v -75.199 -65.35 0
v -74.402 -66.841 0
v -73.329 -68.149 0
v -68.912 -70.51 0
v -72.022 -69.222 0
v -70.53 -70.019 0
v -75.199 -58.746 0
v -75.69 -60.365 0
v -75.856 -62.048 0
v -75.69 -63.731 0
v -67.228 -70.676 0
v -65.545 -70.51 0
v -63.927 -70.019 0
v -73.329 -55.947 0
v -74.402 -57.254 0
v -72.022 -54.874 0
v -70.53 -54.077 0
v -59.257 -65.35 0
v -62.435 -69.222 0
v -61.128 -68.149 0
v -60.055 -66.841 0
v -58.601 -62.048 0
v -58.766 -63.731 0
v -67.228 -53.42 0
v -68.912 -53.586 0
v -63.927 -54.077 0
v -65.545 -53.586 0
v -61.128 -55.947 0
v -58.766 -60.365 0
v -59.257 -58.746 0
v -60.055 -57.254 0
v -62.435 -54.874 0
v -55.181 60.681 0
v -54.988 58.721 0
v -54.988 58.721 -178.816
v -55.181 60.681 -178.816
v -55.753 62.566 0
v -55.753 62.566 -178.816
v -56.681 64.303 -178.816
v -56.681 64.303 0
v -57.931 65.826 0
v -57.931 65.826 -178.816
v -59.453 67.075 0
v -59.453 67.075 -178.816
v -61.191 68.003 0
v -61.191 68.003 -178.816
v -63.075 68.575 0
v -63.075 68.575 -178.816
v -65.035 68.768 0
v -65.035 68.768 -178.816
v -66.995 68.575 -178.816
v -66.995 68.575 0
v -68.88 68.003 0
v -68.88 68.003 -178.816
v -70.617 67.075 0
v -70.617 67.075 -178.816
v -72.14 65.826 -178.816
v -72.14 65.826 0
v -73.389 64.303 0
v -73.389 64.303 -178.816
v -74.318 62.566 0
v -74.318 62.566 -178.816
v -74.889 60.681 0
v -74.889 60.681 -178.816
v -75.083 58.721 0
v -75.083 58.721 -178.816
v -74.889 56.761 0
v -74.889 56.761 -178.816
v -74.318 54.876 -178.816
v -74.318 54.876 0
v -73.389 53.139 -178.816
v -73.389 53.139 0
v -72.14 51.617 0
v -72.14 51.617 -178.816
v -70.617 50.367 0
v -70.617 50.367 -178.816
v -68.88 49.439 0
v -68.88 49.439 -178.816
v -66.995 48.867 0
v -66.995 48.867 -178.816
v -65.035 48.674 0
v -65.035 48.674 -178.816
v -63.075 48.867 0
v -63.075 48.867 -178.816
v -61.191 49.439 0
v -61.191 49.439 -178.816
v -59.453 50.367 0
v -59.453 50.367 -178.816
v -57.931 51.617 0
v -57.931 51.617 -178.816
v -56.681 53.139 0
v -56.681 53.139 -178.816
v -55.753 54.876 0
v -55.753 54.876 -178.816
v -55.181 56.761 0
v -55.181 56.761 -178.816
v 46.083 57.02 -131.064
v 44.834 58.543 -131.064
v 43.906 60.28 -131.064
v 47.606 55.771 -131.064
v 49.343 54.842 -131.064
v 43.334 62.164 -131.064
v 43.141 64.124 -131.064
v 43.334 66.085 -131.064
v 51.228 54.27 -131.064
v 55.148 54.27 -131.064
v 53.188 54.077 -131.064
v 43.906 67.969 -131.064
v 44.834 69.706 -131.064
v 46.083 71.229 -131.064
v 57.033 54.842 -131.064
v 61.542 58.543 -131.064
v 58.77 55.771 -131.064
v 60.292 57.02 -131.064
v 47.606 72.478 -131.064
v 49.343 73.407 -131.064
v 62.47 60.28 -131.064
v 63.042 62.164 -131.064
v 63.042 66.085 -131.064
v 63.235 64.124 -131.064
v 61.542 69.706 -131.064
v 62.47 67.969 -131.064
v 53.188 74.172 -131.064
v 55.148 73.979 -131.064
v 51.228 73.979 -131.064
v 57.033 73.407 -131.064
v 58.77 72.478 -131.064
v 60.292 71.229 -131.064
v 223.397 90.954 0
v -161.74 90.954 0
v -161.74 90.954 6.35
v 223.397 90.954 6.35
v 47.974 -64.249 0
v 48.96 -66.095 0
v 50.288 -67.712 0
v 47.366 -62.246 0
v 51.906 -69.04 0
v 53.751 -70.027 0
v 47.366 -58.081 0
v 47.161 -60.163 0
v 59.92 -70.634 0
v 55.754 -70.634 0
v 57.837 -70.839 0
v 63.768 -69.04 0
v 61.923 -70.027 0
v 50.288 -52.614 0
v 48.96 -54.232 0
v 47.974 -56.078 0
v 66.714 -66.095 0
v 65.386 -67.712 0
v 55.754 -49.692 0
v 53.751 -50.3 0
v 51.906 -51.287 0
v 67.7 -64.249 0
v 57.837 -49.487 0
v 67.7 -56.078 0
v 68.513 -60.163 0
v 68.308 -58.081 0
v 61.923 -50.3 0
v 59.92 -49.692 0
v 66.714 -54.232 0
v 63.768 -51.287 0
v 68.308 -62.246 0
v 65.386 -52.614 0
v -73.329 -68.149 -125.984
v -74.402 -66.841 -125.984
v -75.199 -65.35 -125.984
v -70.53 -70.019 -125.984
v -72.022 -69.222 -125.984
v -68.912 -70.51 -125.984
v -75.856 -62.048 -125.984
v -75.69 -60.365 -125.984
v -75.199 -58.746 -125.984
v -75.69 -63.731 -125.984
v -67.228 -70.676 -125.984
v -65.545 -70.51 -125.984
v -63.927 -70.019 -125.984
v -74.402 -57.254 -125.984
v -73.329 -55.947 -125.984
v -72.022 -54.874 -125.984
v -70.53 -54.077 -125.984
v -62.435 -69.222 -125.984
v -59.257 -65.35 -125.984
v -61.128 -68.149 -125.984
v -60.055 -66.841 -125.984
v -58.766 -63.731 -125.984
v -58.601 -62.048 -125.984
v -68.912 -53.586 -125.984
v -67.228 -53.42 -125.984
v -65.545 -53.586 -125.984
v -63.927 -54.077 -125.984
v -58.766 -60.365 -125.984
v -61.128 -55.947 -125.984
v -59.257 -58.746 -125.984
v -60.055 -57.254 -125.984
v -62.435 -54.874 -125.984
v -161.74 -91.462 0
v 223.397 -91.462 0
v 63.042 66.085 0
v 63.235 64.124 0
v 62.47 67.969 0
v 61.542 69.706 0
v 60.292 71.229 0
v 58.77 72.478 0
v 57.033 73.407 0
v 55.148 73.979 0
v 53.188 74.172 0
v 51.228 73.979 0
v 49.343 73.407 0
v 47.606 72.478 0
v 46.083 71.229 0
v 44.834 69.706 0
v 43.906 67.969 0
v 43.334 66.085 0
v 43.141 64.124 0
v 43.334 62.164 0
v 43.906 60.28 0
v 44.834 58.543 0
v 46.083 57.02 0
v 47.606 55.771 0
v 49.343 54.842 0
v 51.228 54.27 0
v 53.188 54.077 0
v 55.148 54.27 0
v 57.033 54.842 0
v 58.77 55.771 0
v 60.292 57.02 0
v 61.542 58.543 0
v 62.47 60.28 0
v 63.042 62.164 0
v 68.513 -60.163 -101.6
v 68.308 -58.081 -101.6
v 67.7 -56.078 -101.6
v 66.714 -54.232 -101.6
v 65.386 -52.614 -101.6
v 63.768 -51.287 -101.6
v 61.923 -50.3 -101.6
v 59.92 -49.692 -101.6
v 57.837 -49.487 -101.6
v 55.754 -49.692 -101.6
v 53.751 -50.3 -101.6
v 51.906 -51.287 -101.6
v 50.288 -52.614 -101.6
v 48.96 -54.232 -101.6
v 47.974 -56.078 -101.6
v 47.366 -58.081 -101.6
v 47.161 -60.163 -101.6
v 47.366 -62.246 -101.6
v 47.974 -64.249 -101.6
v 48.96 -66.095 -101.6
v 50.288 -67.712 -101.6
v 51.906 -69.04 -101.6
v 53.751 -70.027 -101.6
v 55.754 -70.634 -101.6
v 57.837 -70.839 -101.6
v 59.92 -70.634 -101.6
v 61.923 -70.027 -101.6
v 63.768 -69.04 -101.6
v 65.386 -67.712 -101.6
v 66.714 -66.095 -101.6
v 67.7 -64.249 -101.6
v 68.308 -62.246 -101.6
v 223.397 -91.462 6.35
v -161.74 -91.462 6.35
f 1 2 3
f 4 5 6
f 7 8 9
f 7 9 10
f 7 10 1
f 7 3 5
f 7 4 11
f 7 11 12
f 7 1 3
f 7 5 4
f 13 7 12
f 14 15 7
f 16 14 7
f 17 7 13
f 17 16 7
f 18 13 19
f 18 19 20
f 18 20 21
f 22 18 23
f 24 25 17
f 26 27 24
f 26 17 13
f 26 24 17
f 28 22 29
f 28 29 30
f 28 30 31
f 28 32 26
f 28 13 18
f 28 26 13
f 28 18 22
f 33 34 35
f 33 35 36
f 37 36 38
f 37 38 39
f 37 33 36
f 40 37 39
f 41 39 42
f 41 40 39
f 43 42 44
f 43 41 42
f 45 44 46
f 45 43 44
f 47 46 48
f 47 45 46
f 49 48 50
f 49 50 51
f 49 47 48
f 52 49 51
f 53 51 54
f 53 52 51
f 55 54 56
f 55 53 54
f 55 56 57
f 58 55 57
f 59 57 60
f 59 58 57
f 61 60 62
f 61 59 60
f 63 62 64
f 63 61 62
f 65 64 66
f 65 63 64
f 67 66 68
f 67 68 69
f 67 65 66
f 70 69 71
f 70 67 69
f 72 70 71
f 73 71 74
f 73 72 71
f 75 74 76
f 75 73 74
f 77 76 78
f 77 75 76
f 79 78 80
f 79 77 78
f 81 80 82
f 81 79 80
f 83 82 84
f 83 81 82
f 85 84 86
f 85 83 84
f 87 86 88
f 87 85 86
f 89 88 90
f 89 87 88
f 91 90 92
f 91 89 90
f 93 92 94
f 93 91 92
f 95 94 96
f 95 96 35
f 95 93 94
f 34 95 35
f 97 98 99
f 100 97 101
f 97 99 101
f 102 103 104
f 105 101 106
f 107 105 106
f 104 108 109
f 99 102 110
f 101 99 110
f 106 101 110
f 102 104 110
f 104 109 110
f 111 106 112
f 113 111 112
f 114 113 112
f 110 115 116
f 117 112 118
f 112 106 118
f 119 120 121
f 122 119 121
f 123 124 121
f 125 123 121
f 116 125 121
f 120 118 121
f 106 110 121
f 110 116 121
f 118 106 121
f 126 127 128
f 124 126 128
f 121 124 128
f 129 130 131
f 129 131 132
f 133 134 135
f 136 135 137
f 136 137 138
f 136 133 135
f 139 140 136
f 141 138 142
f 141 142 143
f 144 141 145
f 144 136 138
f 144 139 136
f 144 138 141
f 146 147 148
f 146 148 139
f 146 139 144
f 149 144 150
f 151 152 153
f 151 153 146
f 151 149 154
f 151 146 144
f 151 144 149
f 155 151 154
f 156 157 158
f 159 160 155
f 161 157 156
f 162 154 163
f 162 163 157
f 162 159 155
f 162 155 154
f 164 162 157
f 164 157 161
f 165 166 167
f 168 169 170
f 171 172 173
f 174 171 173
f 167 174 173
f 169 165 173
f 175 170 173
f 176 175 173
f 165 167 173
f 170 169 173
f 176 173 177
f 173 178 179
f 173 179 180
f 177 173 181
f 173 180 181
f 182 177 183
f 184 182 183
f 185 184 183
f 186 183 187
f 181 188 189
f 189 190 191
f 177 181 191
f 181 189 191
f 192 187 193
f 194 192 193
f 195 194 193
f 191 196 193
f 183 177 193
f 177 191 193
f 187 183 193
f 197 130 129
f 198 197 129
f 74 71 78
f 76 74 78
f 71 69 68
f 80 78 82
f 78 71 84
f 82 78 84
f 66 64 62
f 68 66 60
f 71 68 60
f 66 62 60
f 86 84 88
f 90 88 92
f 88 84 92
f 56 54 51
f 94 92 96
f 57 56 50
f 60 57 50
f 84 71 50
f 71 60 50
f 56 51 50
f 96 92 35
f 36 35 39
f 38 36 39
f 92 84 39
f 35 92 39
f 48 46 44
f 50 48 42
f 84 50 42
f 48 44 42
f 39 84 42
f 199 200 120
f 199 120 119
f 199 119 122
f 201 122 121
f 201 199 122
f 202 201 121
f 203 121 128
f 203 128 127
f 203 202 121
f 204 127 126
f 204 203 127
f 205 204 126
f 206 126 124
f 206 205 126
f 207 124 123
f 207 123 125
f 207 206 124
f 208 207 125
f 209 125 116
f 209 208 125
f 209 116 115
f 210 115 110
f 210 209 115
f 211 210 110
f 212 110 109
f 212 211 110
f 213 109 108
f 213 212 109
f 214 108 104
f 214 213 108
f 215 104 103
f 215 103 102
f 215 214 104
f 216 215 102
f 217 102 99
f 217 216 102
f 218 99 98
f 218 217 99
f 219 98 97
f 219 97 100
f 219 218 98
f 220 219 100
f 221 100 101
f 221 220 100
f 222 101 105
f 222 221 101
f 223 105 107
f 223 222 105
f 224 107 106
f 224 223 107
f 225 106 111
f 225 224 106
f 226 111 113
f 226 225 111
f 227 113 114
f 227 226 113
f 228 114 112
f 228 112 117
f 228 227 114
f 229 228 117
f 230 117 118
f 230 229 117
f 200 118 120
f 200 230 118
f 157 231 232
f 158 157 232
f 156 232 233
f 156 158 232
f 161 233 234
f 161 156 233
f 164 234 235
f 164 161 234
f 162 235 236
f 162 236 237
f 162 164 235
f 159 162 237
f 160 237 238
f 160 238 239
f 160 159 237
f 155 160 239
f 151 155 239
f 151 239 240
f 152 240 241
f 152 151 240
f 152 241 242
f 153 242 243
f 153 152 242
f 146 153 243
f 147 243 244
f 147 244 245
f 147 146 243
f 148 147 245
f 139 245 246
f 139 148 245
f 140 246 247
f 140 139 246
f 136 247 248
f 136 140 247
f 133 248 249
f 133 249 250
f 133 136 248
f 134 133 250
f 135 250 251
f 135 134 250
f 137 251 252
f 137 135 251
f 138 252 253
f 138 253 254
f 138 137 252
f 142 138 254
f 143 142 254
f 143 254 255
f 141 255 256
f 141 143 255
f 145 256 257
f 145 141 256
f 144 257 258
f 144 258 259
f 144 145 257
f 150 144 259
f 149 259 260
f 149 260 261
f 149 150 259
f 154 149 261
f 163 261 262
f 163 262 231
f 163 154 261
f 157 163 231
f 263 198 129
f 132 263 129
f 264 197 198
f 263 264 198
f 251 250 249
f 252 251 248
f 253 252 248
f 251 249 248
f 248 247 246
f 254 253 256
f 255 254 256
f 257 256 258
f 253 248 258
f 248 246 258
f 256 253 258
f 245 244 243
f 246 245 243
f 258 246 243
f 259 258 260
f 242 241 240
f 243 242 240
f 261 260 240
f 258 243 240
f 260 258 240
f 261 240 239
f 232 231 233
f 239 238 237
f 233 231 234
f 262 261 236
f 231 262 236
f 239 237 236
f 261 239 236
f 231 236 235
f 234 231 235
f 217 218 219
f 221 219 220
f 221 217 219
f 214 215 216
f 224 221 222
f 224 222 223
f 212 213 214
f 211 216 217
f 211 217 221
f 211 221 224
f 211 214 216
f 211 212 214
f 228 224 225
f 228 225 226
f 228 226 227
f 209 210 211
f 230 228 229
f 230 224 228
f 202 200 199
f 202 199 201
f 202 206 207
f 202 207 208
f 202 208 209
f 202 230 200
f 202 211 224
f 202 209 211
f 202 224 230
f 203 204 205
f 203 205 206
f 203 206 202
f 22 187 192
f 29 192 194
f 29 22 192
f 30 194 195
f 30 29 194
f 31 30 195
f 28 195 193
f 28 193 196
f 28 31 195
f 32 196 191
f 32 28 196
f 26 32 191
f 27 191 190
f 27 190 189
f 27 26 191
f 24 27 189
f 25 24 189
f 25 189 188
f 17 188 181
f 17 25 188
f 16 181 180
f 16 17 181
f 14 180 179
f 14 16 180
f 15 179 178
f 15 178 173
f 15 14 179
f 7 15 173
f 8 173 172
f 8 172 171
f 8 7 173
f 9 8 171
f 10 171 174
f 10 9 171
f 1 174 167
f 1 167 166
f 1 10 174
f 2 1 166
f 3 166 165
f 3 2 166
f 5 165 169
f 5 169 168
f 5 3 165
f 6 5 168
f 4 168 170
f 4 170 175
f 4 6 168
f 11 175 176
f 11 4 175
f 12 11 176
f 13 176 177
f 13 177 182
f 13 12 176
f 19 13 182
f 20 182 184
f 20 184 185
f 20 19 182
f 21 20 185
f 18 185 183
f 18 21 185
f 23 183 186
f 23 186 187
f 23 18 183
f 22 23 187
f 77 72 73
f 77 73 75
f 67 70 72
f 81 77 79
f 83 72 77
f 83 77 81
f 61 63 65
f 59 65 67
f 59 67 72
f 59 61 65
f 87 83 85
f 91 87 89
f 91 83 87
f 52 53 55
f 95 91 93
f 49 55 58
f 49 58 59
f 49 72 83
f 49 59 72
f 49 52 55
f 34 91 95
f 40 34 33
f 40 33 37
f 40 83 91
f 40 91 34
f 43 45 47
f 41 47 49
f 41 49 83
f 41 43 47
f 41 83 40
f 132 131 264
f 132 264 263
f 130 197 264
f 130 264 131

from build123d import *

# Parameters (mm, degrees)
F0_R     = 10.047134
F1_DEPTH = 178.816
F2_R     = 10.047128
F3_DEPTH = 131.064
F4_R     = 8.627773
F5_DEPTH = 125.984
F6_R     = 10.676004
F7_DEPTH = 101.6
F8_W     = 385.136962
F8_H     = 182.416007
F9_DEPTH = 6.35


with BuildPart() as f1:
    # F0 (on Top) → F1 (new body)
    with BuildSketch(Plane.XY):
        with Locations((-65.035373, 58.721106)):
            Circle(F0_R)
    extrude(amount=-F1_DEPTH)


with BuildPart() as f3:
    # F2 (on Top) → F3 (new body)
    with BuildSketch(Plane.XY):
        with Locations((53.187836, 64.124458)):
            Circle(F2_R)
    extrude(amount=-F3_DEPTH)


with BuildPart() as f5:
    # F4 (on Top) → F5 (new body)
    with BuildSketch(Plane.XY):
        with Locations((-67.22834, -62.047824)):
            Circle(F4_R)
    extrude(amount=-F5_DEPTH)


with BuildPart() as f7:
    # F6 (on Top) → F7 (new body)
    with BuildSketch(Plane.XY):
        with Locations((57.837021, -60.163338)):
            Circle(F6_R)
    extrude(amount=-F7_DEPTH)


with BuildPart() as f9:
    # F8 (on Top) → F9 (new body)
    with BuildSketch(Plane.XY):
        with Locations((30.828655, -0.254355)):
            Rectangle(F8_W, F8_H)
    extrude(amount=F9_DEPTH)


solid = Compound([f1.part, f3.part, f5.part, f7.part, f9.part])
